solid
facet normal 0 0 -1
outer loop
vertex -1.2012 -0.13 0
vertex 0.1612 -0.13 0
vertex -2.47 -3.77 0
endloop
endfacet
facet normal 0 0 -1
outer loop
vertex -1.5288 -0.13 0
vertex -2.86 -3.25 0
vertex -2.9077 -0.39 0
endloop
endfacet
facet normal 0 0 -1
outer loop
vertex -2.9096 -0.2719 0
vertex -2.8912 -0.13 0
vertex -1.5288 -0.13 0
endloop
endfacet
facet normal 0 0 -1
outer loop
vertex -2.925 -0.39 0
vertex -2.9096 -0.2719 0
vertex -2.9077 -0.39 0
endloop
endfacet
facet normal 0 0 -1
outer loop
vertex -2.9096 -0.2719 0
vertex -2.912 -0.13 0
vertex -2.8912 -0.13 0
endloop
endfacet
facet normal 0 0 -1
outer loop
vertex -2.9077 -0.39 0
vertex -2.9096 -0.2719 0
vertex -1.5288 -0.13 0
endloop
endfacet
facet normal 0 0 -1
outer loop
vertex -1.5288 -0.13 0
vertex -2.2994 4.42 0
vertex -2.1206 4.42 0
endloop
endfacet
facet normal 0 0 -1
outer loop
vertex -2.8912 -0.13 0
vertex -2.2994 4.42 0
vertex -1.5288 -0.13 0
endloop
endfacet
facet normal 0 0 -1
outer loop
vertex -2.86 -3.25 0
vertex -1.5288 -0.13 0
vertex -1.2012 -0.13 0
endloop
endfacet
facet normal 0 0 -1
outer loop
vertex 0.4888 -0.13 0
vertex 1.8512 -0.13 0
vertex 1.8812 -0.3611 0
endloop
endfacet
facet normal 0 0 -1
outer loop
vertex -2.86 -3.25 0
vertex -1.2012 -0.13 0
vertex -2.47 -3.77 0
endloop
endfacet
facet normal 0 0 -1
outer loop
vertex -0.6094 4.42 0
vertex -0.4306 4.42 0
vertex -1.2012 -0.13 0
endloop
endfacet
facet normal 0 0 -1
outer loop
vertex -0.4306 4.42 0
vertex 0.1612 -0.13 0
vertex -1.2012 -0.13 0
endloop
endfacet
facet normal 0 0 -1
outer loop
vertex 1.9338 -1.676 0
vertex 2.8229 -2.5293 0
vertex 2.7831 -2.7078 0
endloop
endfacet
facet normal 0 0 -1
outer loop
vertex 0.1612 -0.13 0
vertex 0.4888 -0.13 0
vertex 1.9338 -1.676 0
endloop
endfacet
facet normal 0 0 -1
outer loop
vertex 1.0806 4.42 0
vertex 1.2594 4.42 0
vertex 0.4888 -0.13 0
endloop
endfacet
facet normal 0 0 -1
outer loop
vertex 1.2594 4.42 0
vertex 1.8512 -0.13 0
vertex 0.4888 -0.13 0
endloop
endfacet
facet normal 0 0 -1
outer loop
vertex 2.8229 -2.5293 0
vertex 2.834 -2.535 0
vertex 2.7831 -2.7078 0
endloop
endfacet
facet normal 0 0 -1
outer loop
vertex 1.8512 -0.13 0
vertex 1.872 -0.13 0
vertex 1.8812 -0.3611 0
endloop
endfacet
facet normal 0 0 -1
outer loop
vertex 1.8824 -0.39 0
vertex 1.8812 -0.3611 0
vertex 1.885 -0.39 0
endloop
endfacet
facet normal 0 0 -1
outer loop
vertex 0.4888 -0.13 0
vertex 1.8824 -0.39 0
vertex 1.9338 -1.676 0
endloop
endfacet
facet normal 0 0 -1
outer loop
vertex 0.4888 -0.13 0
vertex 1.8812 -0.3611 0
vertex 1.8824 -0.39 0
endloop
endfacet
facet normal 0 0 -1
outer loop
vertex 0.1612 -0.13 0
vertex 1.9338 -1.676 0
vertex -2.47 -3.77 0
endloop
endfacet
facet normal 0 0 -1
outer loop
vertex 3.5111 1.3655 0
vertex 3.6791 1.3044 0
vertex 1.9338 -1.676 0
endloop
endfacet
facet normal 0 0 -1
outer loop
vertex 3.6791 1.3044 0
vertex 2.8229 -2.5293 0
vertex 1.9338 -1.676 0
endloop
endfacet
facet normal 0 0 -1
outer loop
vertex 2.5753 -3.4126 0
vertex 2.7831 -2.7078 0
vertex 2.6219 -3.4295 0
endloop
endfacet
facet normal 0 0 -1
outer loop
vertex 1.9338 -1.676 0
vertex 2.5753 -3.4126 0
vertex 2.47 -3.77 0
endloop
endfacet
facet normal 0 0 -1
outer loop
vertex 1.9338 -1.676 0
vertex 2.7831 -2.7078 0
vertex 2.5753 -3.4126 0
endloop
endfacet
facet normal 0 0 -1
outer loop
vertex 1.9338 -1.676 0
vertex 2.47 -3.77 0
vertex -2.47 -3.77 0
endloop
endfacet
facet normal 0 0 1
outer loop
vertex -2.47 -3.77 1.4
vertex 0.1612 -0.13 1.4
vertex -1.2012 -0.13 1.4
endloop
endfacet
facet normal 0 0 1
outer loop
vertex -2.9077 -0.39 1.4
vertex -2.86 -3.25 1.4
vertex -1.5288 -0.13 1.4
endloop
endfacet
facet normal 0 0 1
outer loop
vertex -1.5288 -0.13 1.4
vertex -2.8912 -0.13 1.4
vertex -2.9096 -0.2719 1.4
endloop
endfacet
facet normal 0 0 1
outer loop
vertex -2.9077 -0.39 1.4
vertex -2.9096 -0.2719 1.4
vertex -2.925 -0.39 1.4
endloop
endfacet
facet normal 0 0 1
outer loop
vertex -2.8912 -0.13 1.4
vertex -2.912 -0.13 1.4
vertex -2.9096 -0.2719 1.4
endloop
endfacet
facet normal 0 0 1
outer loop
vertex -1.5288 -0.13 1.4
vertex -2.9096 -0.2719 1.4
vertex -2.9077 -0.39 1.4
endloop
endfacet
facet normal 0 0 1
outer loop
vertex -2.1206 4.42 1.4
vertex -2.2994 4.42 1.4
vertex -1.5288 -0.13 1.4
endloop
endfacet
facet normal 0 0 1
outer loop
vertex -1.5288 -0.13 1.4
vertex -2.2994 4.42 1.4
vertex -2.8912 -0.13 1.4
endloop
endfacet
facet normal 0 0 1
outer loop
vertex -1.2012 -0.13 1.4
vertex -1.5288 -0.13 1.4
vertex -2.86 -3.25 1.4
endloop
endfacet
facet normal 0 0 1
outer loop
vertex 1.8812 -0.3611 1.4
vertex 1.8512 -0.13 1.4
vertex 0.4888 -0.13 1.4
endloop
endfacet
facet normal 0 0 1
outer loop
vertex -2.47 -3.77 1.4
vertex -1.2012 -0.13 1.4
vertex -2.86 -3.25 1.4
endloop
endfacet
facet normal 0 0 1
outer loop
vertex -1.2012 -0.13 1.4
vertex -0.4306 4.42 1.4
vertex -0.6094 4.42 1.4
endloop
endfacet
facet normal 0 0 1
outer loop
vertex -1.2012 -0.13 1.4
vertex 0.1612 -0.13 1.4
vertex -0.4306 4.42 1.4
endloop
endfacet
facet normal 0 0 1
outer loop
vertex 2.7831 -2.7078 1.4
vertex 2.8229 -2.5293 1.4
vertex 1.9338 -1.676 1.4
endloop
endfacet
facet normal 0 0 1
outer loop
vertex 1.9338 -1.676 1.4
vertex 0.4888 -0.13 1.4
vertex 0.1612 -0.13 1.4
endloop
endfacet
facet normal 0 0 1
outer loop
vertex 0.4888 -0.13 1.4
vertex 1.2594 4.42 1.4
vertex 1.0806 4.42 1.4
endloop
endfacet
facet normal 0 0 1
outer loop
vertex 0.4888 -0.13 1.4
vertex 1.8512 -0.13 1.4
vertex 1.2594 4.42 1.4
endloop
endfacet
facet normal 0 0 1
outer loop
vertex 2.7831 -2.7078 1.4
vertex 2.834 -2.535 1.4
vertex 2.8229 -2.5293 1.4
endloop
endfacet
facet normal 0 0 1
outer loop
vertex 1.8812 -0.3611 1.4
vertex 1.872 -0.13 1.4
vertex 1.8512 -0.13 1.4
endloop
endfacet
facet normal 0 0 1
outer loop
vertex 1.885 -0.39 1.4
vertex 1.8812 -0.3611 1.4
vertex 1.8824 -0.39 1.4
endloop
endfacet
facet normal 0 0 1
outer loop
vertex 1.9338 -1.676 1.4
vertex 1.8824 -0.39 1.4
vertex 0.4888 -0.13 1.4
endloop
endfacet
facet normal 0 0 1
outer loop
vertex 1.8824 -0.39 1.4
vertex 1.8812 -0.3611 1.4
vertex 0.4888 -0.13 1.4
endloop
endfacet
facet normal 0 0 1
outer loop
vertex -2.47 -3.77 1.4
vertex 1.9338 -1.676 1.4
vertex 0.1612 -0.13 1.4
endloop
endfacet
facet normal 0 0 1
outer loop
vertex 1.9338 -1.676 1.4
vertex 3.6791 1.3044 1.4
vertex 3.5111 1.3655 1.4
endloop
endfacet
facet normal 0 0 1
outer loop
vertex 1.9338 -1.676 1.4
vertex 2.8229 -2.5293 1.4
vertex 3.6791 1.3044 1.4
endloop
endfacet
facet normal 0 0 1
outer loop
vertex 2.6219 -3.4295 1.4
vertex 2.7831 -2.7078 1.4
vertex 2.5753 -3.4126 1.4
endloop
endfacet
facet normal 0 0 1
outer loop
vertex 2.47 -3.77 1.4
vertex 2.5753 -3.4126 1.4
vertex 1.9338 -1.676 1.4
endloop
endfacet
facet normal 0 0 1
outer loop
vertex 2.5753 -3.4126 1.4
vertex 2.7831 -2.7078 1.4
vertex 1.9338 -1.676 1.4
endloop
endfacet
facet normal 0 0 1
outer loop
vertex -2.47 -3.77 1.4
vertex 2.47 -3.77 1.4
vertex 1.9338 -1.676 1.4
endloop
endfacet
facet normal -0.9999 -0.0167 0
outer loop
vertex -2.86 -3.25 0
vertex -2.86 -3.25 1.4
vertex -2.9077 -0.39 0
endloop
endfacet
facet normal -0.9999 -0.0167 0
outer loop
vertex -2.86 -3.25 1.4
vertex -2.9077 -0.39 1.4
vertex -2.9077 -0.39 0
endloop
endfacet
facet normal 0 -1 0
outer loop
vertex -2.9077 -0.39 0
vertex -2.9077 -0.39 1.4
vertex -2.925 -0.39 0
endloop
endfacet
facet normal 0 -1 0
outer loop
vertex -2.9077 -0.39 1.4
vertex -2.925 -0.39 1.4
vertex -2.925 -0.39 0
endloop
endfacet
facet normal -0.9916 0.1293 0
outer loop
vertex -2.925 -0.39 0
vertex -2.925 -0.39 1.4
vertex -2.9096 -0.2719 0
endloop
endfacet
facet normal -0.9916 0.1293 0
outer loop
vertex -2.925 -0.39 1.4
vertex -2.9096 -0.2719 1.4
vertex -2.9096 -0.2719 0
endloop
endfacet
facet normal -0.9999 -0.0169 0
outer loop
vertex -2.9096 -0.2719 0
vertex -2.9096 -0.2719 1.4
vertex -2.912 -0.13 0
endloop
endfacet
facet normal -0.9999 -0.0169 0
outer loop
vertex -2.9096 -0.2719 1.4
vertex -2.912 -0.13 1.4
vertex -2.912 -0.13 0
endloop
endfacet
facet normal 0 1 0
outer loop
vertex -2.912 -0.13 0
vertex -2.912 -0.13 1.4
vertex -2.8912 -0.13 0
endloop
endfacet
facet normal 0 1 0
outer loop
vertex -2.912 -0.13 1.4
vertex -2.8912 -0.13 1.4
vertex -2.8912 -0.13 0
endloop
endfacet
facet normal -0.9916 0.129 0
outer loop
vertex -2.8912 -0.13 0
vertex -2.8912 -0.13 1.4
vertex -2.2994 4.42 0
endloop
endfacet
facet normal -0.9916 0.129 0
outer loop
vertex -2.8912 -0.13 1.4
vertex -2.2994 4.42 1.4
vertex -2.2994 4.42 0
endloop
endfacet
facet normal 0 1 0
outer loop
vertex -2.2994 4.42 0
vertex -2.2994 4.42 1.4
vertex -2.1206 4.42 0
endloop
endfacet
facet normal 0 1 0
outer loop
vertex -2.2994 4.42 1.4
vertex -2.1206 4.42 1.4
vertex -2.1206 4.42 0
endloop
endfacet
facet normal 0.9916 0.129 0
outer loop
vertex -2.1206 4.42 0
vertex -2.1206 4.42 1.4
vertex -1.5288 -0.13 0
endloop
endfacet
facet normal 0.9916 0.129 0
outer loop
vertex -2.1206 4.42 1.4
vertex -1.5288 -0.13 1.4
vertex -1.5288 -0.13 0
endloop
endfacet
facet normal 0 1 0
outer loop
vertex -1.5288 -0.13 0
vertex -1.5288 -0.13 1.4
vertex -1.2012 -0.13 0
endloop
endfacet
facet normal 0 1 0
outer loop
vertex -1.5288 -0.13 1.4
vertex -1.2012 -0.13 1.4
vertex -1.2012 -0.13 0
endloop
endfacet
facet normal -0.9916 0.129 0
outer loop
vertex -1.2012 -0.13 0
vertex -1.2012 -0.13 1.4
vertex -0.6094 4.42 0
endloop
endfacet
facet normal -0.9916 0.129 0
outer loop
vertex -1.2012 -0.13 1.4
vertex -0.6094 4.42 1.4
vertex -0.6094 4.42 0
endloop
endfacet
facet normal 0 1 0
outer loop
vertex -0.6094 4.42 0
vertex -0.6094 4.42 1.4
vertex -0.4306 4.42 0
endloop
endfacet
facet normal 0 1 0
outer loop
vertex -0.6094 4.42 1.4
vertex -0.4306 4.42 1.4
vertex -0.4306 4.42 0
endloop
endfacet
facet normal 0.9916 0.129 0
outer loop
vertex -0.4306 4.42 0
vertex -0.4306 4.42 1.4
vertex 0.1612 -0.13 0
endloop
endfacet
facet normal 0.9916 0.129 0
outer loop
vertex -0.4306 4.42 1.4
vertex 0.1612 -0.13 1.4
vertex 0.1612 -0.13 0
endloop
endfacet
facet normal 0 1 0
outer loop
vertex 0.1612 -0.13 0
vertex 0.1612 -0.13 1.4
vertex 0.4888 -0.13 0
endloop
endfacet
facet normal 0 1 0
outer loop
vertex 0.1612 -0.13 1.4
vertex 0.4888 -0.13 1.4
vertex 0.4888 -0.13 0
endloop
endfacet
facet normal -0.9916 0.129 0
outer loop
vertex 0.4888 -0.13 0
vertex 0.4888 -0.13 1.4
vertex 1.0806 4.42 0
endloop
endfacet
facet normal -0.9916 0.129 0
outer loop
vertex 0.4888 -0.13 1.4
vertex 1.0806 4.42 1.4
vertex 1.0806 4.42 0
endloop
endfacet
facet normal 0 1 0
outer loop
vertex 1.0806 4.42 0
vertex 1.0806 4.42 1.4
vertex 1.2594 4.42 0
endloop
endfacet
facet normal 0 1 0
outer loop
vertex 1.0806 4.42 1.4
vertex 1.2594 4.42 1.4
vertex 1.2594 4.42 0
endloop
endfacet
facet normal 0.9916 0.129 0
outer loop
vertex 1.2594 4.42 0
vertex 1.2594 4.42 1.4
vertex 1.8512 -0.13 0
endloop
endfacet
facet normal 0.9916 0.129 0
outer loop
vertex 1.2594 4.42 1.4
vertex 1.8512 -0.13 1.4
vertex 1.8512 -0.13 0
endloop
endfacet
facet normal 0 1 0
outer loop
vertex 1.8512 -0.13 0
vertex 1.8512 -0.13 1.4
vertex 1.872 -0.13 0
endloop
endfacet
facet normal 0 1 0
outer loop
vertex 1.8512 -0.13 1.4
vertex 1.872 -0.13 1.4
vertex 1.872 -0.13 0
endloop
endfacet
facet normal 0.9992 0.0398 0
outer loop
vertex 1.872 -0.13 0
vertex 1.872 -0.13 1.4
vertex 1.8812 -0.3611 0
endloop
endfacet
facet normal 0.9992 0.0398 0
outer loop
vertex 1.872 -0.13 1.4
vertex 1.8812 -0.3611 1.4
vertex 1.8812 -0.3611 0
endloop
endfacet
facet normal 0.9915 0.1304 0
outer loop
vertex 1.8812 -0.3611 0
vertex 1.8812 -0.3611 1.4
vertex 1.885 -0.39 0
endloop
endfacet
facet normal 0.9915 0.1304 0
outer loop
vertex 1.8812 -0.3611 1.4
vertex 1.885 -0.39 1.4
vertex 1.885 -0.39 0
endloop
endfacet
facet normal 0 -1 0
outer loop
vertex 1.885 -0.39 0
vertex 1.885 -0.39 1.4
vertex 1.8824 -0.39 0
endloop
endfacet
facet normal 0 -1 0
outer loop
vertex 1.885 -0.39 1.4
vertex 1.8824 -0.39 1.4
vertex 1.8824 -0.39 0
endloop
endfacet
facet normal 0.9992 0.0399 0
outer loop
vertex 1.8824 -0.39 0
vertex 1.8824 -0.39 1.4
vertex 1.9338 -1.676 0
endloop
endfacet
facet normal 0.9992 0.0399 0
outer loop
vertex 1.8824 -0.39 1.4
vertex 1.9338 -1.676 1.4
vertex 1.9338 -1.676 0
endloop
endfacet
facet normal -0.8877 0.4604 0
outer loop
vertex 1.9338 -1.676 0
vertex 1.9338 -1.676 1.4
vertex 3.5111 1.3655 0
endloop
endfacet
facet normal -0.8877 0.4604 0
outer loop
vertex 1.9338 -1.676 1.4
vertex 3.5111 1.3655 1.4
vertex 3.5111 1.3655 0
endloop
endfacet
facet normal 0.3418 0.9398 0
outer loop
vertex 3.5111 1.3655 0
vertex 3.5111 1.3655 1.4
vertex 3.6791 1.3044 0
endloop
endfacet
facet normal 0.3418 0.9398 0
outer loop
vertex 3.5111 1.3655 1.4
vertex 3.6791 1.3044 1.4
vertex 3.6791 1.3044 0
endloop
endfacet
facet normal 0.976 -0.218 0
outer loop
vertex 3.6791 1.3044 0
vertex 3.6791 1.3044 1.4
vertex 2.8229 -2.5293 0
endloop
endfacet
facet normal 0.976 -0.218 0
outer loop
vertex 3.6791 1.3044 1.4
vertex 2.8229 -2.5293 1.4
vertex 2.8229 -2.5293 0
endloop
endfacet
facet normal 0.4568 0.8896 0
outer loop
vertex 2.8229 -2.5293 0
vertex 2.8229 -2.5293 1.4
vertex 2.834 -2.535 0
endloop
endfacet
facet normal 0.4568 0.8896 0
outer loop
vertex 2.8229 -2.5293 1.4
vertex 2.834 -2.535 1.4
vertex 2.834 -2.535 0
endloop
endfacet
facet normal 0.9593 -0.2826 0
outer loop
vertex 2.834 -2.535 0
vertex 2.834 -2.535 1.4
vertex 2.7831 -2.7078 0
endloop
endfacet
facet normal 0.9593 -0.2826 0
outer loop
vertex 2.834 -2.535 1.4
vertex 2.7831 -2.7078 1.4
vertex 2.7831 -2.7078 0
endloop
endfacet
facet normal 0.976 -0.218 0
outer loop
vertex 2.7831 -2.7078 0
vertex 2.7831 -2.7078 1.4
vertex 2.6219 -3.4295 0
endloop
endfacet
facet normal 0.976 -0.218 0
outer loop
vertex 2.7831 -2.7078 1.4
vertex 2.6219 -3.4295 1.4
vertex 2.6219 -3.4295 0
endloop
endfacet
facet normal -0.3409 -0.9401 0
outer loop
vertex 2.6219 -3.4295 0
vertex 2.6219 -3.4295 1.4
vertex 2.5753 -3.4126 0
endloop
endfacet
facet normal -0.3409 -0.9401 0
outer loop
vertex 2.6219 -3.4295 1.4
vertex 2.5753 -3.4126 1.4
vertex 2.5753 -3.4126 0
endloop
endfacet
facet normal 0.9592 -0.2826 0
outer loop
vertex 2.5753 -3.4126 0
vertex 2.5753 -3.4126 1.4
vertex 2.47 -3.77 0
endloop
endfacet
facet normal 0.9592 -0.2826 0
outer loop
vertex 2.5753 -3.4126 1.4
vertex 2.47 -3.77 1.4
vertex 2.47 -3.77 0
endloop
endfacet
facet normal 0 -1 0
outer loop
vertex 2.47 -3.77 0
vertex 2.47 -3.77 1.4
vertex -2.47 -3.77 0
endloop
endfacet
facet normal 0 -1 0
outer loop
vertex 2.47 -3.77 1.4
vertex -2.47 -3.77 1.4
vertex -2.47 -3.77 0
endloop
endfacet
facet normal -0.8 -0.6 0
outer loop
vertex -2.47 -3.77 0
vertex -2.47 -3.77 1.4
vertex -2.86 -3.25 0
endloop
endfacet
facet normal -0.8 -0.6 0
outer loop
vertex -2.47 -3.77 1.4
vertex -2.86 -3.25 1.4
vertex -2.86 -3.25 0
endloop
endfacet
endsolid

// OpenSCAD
// Original dice are 14mm across and way 4g each.

eps = 0.001;

s = 13;
chamfer = 1;
engrave_depth = 1.8;
inlay_height = engrave_depth - 0.4;

module exterior() {
  hull() {
    for (a = [-1, 1], b = [-1, 1], c = [-1, 1]) {
      scale([a, b, c]) {
        translate((s/2 - chamfer) * [1, 1, 1]) {
          sphere(chamfer, $fn=32);
        }
      }
    }
  }
}

module claw_2d() {
  width = 11;
  height = 37;
  polygon([
    [-width/2, 0],
    [-width/16, height],
    [width/16, height],
    [width/2, 0]
  ]);
}

module hit_2d() {
  scale(s * 0.01 * [1, 1]) {
    translate([4, -1]) {
      for (a = 13 * [-1, 0, 1])
        translate([a, -2])
          claw_2d();
      translate([-19, -23.5])
        rotate([0, 0, 20])
          claw_2d();
      polygon([
        [-18.4, 0],
        [-19, -15],
        [-25.8, -18.5],
        [-23, -28],
        [15, -28],
        [18, -24],
        [18.4, 0],
      ]);
    }
  }
}

module hit() {
  linear_extrude(engrave_depth) {
    rotate([0, 0, 180]) {
      offset(0.3, $fn=12) {
        difference() {
          hit_2d();
          
        translate([-2, 4.2]) square([5, 1]);
        }
        
        // Cut off the very sharp peaks; they don't print well anyway.
        translate([-1, 0.8]) square([3, 2]);
      }
    }
  }
}

module miss_2d() {
  $fn = 70;
  
  scale(1.55 * [1, 1]) {
    translate([0, -0.4]) {
      intersection() {
        intersection_for(a = [-1, 1])
          scale([a, 1])
            translate([1, 0])
              circle(3.2);
        
        translate([0, 5])
          square([4, 10], center=true);
      }
      
      translate([-2, -1.7])
        square([4, 1.7]);
    }
  }
}

module miss() {
  linear_extrude(engrave_depth)
    rotate([0, 0, -90])
      offset(0.3, $fn=12)
        miss_2d();
}

// 100% infill.
module die() {
  difference() {
    exterior();
    
    for (a = [0, 90, 180])
      rotate([0, 0, a])
        rotate([90, 0, 0])
          translate([0, 0, s/2 - engrave_depth])
            hit();
    
    for (a = [0, -90])
      rotate([0, a, 0])
        translate([0, 0, s/2 - engrave_depth])
          miss();
  }
}

scale([-1, 1])
  linear_extrude(inlay_height)
    hit_2d();

//linear_extrude(inlay_height)
//  miss_2d();

//die();
